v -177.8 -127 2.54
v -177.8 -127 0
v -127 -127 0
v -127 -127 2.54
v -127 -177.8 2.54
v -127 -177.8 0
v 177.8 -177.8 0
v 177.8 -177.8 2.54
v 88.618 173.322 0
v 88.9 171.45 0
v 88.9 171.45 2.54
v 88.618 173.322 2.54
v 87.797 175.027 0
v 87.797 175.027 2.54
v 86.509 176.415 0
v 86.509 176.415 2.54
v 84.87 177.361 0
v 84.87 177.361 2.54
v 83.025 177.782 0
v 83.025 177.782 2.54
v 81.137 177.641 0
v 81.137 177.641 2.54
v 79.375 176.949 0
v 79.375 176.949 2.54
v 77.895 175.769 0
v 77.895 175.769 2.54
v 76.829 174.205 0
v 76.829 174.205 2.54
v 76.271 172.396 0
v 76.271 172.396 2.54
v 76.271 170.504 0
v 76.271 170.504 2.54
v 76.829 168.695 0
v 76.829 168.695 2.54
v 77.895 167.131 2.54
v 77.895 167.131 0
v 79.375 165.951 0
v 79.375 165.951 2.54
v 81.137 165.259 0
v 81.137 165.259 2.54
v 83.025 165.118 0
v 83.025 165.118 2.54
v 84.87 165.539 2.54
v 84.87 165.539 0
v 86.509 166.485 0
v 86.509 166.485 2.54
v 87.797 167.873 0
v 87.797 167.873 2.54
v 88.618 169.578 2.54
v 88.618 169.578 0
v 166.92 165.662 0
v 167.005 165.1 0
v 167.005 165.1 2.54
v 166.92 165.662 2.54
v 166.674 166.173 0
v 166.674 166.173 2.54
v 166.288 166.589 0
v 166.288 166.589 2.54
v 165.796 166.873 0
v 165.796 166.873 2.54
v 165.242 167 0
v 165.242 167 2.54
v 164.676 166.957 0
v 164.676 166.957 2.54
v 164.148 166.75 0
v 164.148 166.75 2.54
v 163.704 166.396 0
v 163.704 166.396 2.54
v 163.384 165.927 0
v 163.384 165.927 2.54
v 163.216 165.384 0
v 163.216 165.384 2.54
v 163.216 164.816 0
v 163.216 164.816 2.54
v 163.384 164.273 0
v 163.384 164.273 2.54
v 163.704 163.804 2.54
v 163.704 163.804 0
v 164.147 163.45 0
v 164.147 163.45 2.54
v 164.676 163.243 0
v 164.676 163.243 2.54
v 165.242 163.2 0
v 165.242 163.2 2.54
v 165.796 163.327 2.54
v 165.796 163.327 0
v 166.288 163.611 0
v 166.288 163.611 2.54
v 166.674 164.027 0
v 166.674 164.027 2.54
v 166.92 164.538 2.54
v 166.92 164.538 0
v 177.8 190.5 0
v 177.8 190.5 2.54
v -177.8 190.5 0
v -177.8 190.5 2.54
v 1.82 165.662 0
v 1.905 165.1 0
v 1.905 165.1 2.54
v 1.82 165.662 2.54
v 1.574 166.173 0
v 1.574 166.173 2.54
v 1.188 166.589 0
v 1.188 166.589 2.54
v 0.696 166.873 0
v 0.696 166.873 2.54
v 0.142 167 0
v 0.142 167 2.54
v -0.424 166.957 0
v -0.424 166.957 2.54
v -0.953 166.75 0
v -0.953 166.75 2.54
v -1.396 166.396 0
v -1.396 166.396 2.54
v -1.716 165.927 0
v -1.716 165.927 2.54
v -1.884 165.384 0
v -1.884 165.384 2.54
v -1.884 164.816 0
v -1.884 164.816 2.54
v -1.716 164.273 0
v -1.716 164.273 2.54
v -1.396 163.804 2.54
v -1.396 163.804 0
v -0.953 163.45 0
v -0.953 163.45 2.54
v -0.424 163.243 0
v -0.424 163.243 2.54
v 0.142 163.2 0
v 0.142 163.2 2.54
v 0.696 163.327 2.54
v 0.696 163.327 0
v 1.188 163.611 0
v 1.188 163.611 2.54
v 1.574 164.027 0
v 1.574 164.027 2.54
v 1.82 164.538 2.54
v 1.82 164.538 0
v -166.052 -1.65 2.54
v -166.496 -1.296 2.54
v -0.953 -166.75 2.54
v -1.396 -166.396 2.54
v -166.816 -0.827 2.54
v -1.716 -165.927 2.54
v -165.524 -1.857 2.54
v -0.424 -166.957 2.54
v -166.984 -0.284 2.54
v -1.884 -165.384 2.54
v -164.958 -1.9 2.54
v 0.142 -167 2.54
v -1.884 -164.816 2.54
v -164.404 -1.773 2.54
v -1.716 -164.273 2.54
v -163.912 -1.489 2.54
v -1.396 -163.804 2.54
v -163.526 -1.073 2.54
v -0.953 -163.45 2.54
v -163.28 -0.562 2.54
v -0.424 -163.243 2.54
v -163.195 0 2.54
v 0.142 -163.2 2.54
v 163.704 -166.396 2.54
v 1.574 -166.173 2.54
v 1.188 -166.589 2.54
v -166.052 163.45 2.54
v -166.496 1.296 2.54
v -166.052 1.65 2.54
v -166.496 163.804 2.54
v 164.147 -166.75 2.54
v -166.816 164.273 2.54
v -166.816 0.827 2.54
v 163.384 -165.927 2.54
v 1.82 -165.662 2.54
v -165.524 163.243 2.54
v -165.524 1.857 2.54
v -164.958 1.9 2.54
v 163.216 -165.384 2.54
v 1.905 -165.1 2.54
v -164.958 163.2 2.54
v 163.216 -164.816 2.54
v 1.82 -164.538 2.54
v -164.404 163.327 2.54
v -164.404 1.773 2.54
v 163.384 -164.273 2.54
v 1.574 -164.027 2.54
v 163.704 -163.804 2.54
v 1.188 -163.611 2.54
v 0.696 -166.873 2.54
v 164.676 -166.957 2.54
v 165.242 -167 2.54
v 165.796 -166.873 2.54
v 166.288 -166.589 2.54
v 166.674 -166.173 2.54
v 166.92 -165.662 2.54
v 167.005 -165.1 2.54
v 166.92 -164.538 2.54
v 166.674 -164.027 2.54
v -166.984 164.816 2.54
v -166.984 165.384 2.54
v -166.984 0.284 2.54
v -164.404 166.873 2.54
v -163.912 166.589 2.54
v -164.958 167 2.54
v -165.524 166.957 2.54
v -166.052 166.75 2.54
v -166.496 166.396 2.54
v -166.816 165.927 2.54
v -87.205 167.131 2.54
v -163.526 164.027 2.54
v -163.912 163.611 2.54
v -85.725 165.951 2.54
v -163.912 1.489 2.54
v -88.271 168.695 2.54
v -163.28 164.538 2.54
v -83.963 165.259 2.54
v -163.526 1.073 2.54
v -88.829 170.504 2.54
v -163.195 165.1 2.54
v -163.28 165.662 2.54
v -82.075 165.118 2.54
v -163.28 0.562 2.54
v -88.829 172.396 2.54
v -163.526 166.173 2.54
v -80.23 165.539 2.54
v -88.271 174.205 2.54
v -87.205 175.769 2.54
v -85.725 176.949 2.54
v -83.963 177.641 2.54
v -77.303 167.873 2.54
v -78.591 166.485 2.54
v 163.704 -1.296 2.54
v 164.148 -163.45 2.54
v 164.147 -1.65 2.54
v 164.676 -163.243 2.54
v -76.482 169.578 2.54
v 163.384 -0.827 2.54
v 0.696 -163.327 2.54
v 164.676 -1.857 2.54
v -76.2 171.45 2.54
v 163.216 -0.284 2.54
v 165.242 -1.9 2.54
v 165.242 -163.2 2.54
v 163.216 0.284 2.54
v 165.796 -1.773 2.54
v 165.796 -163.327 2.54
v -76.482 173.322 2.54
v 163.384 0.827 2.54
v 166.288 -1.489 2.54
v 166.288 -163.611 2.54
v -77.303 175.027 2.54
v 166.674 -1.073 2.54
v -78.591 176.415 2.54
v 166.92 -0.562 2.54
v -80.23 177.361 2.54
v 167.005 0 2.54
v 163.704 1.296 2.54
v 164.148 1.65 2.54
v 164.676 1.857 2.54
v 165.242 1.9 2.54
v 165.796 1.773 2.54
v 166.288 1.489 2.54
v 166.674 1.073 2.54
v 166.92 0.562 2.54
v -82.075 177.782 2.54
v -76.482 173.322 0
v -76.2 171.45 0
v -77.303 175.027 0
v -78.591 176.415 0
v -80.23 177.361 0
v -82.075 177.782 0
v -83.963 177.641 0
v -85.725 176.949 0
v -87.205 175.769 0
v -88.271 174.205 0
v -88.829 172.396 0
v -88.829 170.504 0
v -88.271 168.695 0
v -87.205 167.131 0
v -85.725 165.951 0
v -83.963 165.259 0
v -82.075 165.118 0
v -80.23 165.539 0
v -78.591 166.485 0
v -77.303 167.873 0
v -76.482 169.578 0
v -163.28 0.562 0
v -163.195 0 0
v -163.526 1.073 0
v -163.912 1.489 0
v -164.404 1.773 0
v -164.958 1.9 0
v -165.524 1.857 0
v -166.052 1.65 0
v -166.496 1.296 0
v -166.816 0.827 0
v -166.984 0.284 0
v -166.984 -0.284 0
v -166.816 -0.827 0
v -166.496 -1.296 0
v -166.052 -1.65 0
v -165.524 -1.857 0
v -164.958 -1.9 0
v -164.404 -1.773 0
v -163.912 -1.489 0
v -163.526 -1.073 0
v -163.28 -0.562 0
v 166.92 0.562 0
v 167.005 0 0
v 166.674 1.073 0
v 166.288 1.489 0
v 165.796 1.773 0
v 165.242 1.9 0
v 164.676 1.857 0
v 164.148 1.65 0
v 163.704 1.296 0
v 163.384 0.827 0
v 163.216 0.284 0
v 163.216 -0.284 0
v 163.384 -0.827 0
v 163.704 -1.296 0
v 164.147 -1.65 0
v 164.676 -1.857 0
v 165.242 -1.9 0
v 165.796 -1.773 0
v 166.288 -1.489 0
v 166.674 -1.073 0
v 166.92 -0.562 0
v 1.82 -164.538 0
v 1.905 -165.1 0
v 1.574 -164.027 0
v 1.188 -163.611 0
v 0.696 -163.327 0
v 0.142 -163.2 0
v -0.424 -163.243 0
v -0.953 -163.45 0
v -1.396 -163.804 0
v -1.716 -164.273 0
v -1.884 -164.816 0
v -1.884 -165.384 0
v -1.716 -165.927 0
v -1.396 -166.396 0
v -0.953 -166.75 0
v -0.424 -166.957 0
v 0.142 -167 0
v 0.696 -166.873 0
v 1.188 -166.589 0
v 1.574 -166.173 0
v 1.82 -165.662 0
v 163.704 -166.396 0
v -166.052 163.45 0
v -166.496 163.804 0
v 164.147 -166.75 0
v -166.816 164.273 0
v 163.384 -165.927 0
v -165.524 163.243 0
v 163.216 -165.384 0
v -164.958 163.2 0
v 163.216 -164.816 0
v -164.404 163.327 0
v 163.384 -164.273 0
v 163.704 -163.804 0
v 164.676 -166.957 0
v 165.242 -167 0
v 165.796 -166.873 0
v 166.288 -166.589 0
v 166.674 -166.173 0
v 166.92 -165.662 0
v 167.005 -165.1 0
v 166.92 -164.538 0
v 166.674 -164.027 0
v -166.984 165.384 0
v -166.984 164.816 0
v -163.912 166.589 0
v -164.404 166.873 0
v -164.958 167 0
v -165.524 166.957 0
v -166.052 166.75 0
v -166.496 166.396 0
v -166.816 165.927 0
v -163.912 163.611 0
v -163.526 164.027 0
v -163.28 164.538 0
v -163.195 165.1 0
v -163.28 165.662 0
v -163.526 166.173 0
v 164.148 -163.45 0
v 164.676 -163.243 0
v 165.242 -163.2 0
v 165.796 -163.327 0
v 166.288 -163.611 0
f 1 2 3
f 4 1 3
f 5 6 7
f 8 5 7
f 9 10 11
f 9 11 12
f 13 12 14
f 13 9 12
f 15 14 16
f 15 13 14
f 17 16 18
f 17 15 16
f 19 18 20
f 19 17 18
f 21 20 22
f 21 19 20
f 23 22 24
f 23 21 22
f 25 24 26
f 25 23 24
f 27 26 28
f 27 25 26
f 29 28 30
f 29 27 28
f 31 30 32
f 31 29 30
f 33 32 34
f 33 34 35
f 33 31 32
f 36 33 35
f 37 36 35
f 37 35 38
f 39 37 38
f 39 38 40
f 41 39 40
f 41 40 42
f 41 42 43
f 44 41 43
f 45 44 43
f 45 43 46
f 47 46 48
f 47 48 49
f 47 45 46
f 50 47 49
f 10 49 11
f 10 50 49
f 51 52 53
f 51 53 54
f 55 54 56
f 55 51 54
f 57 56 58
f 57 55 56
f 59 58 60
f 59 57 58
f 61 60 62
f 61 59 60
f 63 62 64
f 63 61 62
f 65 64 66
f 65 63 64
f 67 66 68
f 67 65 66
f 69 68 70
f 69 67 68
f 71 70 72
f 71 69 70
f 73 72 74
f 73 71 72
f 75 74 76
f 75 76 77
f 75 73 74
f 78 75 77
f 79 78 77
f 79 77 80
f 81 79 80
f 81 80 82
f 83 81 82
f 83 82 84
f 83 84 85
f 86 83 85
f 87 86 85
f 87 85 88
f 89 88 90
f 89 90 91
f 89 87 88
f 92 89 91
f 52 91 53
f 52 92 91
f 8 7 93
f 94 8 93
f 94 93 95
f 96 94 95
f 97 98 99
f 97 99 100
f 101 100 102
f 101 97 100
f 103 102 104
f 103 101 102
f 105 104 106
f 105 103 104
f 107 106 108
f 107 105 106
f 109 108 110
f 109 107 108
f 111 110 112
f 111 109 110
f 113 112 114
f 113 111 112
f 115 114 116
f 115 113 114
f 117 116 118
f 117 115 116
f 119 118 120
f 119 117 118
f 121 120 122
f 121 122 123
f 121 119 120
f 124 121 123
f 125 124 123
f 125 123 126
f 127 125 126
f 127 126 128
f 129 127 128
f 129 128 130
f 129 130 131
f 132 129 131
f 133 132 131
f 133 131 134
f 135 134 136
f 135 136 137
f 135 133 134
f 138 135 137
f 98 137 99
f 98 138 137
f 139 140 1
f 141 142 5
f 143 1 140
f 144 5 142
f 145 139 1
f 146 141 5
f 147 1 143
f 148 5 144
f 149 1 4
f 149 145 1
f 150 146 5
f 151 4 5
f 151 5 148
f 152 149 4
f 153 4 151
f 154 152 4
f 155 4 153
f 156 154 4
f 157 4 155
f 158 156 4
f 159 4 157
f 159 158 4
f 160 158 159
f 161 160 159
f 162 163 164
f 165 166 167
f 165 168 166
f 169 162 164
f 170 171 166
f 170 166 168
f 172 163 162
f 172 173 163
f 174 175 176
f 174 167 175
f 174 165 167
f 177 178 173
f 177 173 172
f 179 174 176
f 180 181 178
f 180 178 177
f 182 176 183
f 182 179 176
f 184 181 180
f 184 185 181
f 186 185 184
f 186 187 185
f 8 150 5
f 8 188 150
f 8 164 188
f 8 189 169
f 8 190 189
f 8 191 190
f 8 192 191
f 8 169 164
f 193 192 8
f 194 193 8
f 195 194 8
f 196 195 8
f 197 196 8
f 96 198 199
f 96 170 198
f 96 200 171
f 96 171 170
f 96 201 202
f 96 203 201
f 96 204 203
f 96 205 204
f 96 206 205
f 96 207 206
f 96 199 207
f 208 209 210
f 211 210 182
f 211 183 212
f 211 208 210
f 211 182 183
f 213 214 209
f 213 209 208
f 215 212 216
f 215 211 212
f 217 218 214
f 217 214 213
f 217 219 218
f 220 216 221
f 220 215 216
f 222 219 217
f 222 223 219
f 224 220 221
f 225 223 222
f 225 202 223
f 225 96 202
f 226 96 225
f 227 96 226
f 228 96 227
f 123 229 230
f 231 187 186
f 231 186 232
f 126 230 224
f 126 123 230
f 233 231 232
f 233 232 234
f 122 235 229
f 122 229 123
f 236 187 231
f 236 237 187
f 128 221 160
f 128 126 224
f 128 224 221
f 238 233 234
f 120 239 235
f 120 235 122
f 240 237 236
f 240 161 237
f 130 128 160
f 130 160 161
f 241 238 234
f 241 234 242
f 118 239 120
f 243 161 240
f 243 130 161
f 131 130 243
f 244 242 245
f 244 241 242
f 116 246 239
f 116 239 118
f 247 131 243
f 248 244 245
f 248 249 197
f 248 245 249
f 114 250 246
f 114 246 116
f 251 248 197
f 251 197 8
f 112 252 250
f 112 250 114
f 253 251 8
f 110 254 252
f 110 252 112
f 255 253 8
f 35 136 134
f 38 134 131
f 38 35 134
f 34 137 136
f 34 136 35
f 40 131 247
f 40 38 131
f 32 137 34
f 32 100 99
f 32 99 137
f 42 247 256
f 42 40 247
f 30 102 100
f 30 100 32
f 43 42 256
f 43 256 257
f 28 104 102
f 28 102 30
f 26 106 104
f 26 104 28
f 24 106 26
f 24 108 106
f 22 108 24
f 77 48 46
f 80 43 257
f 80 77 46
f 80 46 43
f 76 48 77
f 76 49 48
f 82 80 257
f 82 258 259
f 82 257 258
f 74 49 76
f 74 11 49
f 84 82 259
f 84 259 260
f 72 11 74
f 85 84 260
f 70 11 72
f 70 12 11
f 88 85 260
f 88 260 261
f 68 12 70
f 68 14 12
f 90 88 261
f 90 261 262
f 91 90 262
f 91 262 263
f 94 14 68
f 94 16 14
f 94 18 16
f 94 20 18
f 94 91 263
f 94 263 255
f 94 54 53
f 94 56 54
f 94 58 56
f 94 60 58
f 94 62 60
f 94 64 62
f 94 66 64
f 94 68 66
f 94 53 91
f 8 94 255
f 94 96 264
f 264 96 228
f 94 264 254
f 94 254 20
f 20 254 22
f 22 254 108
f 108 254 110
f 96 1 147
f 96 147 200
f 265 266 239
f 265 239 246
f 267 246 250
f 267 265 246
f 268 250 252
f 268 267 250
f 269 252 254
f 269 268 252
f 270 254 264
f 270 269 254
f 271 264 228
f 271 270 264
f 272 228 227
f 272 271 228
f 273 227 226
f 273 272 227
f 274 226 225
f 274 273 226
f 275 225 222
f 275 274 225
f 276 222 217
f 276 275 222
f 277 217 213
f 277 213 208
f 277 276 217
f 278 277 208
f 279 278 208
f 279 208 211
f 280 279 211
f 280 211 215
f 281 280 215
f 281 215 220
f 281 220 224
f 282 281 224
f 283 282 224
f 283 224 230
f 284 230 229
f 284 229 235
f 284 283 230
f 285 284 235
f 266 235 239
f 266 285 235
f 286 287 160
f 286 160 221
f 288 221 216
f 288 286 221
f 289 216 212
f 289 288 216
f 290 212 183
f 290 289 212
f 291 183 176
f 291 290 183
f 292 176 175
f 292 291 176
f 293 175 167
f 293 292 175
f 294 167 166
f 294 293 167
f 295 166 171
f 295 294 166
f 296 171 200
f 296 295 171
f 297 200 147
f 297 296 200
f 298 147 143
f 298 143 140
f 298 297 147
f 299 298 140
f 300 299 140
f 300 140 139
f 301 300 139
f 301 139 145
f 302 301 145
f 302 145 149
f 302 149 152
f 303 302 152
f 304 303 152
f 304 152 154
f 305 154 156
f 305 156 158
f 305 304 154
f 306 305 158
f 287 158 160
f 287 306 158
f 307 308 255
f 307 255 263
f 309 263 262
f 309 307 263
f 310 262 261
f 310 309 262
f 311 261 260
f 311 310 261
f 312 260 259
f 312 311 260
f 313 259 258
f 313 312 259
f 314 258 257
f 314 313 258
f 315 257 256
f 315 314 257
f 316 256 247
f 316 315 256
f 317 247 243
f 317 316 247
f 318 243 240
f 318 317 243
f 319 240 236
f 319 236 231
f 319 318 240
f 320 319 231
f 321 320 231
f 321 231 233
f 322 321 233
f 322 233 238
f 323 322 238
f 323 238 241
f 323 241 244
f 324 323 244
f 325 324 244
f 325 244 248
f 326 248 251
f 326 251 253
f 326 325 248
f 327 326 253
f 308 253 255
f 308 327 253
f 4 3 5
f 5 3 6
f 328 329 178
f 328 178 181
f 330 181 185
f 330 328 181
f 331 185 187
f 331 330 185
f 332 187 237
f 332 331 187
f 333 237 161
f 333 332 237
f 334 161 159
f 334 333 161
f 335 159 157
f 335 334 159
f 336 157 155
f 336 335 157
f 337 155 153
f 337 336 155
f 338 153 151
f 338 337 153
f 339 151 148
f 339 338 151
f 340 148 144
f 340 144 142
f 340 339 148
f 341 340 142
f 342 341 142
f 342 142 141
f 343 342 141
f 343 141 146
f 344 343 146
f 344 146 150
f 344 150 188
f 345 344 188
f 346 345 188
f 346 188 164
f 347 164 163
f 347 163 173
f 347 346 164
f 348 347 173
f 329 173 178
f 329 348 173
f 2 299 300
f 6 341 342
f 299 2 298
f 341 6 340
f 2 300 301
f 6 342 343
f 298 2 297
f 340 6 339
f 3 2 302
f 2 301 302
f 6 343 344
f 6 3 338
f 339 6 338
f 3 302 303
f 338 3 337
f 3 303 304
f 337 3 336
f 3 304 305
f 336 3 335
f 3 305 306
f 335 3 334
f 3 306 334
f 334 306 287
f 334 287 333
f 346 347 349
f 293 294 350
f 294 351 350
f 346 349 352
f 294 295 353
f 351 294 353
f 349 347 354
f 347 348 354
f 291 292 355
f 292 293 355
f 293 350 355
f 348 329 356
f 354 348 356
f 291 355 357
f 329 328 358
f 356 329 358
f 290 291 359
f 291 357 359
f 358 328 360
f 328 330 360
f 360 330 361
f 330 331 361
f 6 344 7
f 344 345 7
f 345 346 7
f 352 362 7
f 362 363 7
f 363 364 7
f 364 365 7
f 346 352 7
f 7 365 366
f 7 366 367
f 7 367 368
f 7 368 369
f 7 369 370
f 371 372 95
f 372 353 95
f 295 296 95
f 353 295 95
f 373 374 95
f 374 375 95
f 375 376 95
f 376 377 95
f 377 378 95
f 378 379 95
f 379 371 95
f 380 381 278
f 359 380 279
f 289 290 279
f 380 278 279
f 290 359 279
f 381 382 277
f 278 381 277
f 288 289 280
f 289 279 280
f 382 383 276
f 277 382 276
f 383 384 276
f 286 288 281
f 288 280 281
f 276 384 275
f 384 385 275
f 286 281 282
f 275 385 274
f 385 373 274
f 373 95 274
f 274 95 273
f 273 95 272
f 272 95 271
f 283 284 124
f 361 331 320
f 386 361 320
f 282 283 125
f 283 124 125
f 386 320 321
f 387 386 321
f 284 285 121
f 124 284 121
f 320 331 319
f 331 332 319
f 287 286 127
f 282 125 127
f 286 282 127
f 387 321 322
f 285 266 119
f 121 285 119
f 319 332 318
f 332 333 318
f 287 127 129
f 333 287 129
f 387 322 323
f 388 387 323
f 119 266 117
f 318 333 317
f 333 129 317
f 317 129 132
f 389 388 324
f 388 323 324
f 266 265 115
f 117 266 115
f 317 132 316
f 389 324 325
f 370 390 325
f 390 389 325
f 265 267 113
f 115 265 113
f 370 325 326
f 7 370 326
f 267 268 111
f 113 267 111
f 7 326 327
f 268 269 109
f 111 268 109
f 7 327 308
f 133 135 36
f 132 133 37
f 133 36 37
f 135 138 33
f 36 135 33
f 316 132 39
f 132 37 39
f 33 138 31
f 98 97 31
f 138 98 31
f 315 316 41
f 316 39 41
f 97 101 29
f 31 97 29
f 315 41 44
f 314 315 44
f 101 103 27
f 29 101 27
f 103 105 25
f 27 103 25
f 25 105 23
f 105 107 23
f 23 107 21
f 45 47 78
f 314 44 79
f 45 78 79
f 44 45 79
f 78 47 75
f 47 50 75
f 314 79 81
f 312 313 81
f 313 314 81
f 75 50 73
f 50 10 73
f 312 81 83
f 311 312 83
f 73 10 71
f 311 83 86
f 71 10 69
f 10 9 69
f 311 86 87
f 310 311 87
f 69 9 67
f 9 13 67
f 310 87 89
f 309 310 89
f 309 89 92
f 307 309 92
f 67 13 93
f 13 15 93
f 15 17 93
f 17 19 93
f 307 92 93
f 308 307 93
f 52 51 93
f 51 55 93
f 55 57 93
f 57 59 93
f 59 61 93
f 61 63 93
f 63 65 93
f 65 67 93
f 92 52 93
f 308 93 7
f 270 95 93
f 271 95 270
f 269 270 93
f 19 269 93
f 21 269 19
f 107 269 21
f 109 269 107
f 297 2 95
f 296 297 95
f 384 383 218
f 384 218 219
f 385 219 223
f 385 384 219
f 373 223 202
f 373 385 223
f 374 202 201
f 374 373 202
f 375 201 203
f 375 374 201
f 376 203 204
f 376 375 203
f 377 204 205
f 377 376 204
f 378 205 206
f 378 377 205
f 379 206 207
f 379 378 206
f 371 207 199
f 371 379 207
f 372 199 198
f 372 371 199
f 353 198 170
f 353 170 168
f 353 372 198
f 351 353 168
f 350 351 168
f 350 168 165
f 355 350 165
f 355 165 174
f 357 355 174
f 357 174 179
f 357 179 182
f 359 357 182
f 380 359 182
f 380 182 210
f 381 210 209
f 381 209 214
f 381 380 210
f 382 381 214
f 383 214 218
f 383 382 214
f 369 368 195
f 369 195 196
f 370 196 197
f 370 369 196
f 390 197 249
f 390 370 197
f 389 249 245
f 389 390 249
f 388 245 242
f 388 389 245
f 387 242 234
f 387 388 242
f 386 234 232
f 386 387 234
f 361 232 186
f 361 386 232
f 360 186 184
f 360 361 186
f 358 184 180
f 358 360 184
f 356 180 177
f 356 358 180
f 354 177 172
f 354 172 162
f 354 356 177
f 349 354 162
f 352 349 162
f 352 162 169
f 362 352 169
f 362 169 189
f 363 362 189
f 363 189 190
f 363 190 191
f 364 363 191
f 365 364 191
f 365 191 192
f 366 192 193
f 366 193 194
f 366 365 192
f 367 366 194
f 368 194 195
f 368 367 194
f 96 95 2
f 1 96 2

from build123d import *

# Parameters (mm, degrees)
F0_R     = 1.905
F0_R_2   = 6.35
F1_DEPTH = 2.54


with BuildPart() as f1:
    # F0 (on Top) → F1 (new body)
    with BuildSketch(Plane.XY):
        Polygon((-127, -177.8), (177.8, -177.8), (177.8, 190.5), (-177.8, 190.5), (-177.8, -127), (-127, -127), align=None)
        with Locations((-165.1, 0)):
            Circle(F0_R, mode=Mode.SUBTRACT)
        with Locations((0, -165.1)):
            Circle(F0_R, mode=Mode.SUBTRACT)
        with Locations((165.1, -165.1)):
            Circle(F0_R, mode=Mode.SUBTRACT)
        with Locations((165.1, 0)):
            Circle(F0_R, mode=Mode.SUBTRACT)
        with Locations((-165.1, 165.1)):
            Circle(F0_R, mode=Mode.SUBTRACT)
        with Locations((-82.55, 171.45)):
            Circle(F0_R_2, mode=Mode.SUBTRACT)
        with Locations((0, 165.1)):
            Circle(F0_R, mode=Mode.SUBTRACT)
        with Locations((82.55, 171.45)):
            Circle(F0_R_2, mode=Mode.SUBTRACT)
        with Locations((165.1, 165.1)):
            Circle(F0_R, mode=Mode.SUBTRACT)
    extrude(amount=F1_DEPTH)


solid = f1.part
